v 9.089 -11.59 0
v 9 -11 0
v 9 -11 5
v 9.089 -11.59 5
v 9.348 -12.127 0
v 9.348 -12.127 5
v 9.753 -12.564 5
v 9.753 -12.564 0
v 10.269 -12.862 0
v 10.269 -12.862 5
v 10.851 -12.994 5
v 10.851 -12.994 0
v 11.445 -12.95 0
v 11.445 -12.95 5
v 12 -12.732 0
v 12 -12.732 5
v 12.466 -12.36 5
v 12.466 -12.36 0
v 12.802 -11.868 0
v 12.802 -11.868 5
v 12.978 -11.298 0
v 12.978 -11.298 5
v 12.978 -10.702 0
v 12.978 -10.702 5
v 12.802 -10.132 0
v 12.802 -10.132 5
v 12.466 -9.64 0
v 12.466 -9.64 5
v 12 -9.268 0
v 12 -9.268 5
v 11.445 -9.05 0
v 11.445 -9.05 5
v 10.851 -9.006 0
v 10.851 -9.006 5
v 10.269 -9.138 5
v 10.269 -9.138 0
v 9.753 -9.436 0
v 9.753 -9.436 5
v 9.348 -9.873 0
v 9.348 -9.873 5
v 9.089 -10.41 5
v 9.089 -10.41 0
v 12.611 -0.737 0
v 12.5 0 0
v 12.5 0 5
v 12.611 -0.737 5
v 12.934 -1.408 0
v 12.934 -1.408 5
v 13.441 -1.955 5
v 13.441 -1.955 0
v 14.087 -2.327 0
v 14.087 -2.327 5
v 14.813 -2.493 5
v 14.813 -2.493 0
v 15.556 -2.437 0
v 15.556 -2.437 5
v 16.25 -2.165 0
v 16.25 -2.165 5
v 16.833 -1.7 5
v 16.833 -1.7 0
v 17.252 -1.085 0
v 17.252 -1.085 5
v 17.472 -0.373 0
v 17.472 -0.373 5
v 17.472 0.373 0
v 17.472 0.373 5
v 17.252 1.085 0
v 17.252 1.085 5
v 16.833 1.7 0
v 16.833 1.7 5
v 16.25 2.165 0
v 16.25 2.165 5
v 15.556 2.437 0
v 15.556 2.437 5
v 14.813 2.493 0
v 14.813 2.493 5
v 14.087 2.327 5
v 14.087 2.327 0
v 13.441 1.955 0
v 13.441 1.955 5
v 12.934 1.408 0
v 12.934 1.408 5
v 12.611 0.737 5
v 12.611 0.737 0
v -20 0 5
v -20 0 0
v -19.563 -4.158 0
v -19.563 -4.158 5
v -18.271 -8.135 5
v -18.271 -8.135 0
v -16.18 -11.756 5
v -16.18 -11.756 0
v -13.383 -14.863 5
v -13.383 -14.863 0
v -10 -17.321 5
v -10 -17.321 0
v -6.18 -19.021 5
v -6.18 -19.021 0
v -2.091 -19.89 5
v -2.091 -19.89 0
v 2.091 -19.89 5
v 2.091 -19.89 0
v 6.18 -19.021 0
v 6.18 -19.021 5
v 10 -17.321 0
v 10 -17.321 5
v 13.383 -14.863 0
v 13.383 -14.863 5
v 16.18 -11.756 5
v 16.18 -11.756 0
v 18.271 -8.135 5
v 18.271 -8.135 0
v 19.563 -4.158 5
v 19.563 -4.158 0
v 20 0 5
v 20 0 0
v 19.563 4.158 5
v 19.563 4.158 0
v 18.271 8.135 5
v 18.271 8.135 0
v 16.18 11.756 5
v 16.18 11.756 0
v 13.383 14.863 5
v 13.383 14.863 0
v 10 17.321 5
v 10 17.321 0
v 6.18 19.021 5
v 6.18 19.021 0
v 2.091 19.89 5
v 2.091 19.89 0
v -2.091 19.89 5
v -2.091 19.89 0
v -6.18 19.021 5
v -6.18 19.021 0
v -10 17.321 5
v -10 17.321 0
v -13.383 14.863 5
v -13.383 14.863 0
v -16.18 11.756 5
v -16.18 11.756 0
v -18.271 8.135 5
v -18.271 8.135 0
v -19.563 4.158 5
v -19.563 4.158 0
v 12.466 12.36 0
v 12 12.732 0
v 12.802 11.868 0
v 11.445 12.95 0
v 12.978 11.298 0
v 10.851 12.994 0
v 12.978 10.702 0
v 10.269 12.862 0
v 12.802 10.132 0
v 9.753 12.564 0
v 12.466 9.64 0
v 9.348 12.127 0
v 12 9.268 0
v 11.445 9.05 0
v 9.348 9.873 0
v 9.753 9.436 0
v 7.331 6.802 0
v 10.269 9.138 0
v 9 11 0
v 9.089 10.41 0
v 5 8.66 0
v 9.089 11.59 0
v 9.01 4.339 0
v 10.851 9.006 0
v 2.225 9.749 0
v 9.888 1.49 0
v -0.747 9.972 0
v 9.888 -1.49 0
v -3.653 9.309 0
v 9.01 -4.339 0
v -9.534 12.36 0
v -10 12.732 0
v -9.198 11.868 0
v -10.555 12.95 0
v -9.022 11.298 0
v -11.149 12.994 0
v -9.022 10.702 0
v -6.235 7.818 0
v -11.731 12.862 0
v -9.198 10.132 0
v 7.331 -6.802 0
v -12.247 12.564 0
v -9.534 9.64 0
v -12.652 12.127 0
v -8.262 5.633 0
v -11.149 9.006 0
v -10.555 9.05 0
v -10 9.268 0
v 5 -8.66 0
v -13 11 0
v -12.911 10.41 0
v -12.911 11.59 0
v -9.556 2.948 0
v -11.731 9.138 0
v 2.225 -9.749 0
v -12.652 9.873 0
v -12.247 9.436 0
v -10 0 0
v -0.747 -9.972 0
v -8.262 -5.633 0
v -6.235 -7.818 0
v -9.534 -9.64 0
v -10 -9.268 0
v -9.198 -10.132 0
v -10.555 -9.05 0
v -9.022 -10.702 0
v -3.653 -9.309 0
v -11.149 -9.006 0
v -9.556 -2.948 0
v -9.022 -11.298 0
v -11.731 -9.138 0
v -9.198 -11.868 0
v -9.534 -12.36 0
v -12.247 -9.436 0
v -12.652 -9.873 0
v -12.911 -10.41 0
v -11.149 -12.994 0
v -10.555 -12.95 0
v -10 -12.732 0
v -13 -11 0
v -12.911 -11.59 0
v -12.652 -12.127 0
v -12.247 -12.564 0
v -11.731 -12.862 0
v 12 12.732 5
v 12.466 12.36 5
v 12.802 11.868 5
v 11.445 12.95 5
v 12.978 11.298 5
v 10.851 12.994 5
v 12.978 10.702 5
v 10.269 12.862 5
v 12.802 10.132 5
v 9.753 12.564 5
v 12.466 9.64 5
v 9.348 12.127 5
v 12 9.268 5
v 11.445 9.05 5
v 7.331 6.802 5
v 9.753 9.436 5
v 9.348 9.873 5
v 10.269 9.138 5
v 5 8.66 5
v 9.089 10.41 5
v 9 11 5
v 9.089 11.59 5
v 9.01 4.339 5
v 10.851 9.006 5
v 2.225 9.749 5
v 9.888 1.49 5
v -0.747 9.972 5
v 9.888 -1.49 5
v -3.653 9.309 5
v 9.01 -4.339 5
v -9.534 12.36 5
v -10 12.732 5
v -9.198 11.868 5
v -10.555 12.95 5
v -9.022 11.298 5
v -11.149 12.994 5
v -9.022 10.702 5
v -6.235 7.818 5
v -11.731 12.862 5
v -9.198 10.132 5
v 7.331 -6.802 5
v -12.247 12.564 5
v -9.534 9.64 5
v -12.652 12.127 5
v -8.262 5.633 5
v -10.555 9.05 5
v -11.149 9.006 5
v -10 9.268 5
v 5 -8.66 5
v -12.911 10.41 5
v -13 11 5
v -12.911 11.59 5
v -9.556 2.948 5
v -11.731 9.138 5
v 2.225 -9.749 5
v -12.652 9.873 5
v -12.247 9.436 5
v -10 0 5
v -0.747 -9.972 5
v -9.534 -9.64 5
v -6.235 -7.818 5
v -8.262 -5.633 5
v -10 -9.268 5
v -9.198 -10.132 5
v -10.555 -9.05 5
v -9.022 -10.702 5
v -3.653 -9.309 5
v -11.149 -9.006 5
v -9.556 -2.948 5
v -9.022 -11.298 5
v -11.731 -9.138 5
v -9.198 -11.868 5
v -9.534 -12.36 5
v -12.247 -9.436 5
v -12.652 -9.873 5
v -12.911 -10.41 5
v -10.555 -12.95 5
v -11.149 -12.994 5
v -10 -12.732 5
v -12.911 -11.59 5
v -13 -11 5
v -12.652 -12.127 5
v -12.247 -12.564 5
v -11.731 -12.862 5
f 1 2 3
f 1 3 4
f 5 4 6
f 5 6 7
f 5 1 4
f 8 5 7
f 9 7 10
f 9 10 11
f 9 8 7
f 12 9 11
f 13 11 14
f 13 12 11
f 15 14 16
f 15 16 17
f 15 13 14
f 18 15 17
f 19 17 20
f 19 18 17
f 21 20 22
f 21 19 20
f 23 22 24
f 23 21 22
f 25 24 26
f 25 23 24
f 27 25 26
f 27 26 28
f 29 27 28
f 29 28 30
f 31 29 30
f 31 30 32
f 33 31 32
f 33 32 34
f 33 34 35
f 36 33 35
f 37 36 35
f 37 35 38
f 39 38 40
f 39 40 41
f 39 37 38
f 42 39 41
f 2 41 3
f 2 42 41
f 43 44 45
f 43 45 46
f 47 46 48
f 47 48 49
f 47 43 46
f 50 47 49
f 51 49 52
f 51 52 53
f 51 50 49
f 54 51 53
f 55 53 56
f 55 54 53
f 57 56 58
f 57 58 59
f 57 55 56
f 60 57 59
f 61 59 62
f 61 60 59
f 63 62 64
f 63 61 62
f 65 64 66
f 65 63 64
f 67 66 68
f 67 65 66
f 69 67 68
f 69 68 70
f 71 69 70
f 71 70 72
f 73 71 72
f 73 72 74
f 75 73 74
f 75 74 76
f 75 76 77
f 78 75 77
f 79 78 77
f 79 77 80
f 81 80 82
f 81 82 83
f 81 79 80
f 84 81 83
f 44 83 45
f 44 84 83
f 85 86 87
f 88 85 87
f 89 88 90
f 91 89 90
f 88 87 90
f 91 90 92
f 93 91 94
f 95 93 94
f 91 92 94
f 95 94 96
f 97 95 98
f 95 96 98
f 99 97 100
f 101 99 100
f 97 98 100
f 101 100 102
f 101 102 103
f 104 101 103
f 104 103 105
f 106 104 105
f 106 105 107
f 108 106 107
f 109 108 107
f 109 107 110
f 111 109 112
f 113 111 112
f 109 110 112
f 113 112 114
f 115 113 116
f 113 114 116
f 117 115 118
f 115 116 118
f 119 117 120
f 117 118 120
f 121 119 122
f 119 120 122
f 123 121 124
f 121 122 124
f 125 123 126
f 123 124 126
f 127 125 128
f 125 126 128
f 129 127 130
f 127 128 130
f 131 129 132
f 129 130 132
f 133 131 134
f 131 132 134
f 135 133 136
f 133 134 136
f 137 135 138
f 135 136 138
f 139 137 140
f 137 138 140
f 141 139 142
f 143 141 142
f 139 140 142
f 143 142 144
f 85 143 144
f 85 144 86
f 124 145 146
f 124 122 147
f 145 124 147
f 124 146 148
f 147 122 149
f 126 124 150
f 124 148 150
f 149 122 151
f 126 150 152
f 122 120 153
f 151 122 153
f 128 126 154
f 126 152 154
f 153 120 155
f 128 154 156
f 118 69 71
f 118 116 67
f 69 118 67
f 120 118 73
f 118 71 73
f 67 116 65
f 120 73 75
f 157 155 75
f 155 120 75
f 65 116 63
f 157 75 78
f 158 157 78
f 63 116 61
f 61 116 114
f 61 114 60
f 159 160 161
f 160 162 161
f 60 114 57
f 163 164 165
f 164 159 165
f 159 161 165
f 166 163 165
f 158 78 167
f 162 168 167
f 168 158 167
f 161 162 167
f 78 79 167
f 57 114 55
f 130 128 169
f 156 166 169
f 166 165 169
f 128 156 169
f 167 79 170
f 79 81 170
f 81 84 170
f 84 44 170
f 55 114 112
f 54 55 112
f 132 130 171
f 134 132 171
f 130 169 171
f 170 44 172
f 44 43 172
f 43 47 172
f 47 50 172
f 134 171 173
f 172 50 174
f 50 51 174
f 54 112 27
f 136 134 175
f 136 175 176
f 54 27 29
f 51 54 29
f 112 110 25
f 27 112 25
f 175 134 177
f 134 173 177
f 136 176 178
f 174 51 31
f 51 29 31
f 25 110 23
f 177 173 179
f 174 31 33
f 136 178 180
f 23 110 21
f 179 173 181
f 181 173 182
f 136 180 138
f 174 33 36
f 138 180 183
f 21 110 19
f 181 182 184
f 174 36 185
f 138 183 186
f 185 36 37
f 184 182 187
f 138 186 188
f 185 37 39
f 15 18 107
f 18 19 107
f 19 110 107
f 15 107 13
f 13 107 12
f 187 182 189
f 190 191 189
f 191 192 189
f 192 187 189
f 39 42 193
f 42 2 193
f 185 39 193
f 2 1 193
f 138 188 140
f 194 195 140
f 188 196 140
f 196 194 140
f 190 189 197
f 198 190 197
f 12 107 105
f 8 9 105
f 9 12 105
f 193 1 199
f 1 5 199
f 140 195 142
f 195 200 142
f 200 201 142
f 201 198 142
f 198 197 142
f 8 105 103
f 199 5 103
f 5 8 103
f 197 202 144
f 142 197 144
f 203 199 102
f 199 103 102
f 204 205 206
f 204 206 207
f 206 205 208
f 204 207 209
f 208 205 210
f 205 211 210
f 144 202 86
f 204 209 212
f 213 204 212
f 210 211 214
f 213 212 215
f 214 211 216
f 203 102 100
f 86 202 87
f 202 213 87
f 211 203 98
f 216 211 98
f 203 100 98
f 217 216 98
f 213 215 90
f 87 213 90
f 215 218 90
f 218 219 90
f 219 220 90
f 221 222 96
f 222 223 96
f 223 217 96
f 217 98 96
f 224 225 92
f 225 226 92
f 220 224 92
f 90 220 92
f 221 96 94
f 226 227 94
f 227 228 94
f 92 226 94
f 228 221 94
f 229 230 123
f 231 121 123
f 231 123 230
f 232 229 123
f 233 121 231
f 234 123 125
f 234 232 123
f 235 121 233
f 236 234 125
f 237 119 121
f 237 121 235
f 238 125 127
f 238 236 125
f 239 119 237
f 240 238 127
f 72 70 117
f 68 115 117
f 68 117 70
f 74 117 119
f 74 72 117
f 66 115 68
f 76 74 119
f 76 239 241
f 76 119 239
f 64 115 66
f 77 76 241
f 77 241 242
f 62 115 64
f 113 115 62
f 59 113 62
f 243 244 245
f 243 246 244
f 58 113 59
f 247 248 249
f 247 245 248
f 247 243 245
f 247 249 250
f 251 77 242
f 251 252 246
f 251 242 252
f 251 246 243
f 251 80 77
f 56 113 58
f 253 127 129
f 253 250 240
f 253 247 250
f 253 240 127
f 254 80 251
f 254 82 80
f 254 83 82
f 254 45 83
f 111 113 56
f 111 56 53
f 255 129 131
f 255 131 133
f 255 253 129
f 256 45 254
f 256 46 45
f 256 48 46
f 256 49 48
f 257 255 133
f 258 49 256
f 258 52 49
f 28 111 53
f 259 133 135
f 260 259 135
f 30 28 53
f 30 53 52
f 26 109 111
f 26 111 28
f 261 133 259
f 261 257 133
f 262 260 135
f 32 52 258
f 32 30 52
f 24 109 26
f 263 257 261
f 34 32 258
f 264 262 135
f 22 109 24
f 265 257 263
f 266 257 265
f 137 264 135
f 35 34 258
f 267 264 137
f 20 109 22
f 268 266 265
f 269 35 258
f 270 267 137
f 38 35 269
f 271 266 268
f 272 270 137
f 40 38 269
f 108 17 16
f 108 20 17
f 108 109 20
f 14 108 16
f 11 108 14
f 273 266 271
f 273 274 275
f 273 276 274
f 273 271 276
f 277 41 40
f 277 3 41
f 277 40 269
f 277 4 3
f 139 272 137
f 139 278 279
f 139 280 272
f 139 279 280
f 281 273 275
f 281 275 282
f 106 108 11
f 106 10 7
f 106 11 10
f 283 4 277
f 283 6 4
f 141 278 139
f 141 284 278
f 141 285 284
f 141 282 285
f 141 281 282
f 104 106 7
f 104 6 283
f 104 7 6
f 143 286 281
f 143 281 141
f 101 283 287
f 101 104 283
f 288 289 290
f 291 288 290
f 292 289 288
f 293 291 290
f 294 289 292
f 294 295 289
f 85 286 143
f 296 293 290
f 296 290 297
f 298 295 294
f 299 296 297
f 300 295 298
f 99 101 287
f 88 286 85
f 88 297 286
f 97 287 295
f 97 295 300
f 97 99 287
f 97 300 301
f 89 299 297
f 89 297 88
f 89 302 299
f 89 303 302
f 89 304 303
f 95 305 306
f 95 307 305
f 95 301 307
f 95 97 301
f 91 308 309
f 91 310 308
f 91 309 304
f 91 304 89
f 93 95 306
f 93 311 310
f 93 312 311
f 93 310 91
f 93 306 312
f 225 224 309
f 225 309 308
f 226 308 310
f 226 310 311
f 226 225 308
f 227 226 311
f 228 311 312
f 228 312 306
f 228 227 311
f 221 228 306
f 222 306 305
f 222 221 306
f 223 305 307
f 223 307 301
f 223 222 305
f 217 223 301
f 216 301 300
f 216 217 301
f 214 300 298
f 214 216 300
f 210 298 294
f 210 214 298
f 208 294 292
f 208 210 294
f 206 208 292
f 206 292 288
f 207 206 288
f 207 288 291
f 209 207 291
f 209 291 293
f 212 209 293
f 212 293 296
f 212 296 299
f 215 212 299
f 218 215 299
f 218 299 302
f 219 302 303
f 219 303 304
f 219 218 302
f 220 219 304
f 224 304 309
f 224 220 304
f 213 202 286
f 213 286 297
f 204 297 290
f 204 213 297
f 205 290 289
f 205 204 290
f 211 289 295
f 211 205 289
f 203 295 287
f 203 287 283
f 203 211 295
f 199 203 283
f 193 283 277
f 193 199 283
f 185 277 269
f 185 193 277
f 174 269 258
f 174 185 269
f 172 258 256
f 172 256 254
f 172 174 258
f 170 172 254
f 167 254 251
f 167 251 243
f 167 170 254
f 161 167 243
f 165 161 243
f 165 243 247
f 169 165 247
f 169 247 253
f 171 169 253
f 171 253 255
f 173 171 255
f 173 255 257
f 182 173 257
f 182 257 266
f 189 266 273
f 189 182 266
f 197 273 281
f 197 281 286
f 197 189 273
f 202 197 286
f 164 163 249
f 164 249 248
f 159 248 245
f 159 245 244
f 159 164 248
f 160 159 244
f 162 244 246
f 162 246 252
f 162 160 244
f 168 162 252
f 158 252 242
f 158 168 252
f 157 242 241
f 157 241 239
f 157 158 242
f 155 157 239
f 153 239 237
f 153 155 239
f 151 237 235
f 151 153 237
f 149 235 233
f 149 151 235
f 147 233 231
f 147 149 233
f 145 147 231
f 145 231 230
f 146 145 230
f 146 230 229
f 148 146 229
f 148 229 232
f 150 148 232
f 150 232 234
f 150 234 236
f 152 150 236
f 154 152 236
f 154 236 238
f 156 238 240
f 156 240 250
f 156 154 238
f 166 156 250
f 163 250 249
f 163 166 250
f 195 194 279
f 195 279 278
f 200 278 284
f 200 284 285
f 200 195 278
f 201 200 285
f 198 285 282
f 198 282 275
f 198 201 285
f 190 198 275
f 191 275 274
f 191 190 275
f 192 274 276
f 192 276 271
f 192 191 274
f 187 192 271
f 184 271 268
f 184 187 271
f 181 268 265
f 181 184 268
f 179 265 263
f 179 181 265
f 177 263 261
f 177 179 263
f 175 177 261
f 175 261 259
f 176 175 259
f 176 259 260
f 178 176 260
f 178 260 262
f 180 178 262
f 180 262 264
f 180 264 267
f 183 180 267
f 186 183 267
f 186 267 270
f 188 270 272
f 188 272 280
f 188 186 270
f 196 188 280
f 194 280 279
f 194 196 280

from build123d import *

# Parameters (mm, degrees)
SKETCH1_R             = 20
SKETCH1_R_2           = 10
SKETCH1_R_3           = 2
SKETCH1_R_4           = 2.5
BOSS_EXTRUDE1_DEPTH   = 5
BODY_MOVE_COPY1_ANGLE = 180


with BuildPart() as part:
    # Sketch1 → Boss-Extrude1 (new body)
    with BuildSketch(Plane(origin=(0, 0, 0), x_dir=(0, 0, -1), z_dir=(1, 0, 0))):
        Circle(SKETCH1_R)
        Circle(SKETCH1_R_2, mode=Mode.SUBTRACT)
        with Locations((-11, 11)):
            Circle(SKETCH1_R_3, mode=Mode.SUBTRACT)
        with Locations((11, 11)):
            Circle(SKETCH1_R_3, mode=Mode.SUBTRACT)
        with Locations((11, -11)):
            Circle(SKETCH1_R_3, mode=Mode.SUBTRACT)
        with Locations((-11, -11)):
            Circle(SKETCH1_R_3, mode=Mode.SUBTRACT)
        with Locations((-15, 0)):
            Circle(SKETCH1_R_4, mode=Mode.SUBTRACT)
    extrude(amount=BOSS_EXTRUDE1_DEPTH)


with BuildPart() as part_1:
    # Body-Move/Copy1: moved
    add(part.part.rotate(Axis((0, 0, 0), (0.7071067811865488, 0, 0.7071067811865462)), BODY_MOVE_COPY1_ANGLE))


solid = part_1.part
